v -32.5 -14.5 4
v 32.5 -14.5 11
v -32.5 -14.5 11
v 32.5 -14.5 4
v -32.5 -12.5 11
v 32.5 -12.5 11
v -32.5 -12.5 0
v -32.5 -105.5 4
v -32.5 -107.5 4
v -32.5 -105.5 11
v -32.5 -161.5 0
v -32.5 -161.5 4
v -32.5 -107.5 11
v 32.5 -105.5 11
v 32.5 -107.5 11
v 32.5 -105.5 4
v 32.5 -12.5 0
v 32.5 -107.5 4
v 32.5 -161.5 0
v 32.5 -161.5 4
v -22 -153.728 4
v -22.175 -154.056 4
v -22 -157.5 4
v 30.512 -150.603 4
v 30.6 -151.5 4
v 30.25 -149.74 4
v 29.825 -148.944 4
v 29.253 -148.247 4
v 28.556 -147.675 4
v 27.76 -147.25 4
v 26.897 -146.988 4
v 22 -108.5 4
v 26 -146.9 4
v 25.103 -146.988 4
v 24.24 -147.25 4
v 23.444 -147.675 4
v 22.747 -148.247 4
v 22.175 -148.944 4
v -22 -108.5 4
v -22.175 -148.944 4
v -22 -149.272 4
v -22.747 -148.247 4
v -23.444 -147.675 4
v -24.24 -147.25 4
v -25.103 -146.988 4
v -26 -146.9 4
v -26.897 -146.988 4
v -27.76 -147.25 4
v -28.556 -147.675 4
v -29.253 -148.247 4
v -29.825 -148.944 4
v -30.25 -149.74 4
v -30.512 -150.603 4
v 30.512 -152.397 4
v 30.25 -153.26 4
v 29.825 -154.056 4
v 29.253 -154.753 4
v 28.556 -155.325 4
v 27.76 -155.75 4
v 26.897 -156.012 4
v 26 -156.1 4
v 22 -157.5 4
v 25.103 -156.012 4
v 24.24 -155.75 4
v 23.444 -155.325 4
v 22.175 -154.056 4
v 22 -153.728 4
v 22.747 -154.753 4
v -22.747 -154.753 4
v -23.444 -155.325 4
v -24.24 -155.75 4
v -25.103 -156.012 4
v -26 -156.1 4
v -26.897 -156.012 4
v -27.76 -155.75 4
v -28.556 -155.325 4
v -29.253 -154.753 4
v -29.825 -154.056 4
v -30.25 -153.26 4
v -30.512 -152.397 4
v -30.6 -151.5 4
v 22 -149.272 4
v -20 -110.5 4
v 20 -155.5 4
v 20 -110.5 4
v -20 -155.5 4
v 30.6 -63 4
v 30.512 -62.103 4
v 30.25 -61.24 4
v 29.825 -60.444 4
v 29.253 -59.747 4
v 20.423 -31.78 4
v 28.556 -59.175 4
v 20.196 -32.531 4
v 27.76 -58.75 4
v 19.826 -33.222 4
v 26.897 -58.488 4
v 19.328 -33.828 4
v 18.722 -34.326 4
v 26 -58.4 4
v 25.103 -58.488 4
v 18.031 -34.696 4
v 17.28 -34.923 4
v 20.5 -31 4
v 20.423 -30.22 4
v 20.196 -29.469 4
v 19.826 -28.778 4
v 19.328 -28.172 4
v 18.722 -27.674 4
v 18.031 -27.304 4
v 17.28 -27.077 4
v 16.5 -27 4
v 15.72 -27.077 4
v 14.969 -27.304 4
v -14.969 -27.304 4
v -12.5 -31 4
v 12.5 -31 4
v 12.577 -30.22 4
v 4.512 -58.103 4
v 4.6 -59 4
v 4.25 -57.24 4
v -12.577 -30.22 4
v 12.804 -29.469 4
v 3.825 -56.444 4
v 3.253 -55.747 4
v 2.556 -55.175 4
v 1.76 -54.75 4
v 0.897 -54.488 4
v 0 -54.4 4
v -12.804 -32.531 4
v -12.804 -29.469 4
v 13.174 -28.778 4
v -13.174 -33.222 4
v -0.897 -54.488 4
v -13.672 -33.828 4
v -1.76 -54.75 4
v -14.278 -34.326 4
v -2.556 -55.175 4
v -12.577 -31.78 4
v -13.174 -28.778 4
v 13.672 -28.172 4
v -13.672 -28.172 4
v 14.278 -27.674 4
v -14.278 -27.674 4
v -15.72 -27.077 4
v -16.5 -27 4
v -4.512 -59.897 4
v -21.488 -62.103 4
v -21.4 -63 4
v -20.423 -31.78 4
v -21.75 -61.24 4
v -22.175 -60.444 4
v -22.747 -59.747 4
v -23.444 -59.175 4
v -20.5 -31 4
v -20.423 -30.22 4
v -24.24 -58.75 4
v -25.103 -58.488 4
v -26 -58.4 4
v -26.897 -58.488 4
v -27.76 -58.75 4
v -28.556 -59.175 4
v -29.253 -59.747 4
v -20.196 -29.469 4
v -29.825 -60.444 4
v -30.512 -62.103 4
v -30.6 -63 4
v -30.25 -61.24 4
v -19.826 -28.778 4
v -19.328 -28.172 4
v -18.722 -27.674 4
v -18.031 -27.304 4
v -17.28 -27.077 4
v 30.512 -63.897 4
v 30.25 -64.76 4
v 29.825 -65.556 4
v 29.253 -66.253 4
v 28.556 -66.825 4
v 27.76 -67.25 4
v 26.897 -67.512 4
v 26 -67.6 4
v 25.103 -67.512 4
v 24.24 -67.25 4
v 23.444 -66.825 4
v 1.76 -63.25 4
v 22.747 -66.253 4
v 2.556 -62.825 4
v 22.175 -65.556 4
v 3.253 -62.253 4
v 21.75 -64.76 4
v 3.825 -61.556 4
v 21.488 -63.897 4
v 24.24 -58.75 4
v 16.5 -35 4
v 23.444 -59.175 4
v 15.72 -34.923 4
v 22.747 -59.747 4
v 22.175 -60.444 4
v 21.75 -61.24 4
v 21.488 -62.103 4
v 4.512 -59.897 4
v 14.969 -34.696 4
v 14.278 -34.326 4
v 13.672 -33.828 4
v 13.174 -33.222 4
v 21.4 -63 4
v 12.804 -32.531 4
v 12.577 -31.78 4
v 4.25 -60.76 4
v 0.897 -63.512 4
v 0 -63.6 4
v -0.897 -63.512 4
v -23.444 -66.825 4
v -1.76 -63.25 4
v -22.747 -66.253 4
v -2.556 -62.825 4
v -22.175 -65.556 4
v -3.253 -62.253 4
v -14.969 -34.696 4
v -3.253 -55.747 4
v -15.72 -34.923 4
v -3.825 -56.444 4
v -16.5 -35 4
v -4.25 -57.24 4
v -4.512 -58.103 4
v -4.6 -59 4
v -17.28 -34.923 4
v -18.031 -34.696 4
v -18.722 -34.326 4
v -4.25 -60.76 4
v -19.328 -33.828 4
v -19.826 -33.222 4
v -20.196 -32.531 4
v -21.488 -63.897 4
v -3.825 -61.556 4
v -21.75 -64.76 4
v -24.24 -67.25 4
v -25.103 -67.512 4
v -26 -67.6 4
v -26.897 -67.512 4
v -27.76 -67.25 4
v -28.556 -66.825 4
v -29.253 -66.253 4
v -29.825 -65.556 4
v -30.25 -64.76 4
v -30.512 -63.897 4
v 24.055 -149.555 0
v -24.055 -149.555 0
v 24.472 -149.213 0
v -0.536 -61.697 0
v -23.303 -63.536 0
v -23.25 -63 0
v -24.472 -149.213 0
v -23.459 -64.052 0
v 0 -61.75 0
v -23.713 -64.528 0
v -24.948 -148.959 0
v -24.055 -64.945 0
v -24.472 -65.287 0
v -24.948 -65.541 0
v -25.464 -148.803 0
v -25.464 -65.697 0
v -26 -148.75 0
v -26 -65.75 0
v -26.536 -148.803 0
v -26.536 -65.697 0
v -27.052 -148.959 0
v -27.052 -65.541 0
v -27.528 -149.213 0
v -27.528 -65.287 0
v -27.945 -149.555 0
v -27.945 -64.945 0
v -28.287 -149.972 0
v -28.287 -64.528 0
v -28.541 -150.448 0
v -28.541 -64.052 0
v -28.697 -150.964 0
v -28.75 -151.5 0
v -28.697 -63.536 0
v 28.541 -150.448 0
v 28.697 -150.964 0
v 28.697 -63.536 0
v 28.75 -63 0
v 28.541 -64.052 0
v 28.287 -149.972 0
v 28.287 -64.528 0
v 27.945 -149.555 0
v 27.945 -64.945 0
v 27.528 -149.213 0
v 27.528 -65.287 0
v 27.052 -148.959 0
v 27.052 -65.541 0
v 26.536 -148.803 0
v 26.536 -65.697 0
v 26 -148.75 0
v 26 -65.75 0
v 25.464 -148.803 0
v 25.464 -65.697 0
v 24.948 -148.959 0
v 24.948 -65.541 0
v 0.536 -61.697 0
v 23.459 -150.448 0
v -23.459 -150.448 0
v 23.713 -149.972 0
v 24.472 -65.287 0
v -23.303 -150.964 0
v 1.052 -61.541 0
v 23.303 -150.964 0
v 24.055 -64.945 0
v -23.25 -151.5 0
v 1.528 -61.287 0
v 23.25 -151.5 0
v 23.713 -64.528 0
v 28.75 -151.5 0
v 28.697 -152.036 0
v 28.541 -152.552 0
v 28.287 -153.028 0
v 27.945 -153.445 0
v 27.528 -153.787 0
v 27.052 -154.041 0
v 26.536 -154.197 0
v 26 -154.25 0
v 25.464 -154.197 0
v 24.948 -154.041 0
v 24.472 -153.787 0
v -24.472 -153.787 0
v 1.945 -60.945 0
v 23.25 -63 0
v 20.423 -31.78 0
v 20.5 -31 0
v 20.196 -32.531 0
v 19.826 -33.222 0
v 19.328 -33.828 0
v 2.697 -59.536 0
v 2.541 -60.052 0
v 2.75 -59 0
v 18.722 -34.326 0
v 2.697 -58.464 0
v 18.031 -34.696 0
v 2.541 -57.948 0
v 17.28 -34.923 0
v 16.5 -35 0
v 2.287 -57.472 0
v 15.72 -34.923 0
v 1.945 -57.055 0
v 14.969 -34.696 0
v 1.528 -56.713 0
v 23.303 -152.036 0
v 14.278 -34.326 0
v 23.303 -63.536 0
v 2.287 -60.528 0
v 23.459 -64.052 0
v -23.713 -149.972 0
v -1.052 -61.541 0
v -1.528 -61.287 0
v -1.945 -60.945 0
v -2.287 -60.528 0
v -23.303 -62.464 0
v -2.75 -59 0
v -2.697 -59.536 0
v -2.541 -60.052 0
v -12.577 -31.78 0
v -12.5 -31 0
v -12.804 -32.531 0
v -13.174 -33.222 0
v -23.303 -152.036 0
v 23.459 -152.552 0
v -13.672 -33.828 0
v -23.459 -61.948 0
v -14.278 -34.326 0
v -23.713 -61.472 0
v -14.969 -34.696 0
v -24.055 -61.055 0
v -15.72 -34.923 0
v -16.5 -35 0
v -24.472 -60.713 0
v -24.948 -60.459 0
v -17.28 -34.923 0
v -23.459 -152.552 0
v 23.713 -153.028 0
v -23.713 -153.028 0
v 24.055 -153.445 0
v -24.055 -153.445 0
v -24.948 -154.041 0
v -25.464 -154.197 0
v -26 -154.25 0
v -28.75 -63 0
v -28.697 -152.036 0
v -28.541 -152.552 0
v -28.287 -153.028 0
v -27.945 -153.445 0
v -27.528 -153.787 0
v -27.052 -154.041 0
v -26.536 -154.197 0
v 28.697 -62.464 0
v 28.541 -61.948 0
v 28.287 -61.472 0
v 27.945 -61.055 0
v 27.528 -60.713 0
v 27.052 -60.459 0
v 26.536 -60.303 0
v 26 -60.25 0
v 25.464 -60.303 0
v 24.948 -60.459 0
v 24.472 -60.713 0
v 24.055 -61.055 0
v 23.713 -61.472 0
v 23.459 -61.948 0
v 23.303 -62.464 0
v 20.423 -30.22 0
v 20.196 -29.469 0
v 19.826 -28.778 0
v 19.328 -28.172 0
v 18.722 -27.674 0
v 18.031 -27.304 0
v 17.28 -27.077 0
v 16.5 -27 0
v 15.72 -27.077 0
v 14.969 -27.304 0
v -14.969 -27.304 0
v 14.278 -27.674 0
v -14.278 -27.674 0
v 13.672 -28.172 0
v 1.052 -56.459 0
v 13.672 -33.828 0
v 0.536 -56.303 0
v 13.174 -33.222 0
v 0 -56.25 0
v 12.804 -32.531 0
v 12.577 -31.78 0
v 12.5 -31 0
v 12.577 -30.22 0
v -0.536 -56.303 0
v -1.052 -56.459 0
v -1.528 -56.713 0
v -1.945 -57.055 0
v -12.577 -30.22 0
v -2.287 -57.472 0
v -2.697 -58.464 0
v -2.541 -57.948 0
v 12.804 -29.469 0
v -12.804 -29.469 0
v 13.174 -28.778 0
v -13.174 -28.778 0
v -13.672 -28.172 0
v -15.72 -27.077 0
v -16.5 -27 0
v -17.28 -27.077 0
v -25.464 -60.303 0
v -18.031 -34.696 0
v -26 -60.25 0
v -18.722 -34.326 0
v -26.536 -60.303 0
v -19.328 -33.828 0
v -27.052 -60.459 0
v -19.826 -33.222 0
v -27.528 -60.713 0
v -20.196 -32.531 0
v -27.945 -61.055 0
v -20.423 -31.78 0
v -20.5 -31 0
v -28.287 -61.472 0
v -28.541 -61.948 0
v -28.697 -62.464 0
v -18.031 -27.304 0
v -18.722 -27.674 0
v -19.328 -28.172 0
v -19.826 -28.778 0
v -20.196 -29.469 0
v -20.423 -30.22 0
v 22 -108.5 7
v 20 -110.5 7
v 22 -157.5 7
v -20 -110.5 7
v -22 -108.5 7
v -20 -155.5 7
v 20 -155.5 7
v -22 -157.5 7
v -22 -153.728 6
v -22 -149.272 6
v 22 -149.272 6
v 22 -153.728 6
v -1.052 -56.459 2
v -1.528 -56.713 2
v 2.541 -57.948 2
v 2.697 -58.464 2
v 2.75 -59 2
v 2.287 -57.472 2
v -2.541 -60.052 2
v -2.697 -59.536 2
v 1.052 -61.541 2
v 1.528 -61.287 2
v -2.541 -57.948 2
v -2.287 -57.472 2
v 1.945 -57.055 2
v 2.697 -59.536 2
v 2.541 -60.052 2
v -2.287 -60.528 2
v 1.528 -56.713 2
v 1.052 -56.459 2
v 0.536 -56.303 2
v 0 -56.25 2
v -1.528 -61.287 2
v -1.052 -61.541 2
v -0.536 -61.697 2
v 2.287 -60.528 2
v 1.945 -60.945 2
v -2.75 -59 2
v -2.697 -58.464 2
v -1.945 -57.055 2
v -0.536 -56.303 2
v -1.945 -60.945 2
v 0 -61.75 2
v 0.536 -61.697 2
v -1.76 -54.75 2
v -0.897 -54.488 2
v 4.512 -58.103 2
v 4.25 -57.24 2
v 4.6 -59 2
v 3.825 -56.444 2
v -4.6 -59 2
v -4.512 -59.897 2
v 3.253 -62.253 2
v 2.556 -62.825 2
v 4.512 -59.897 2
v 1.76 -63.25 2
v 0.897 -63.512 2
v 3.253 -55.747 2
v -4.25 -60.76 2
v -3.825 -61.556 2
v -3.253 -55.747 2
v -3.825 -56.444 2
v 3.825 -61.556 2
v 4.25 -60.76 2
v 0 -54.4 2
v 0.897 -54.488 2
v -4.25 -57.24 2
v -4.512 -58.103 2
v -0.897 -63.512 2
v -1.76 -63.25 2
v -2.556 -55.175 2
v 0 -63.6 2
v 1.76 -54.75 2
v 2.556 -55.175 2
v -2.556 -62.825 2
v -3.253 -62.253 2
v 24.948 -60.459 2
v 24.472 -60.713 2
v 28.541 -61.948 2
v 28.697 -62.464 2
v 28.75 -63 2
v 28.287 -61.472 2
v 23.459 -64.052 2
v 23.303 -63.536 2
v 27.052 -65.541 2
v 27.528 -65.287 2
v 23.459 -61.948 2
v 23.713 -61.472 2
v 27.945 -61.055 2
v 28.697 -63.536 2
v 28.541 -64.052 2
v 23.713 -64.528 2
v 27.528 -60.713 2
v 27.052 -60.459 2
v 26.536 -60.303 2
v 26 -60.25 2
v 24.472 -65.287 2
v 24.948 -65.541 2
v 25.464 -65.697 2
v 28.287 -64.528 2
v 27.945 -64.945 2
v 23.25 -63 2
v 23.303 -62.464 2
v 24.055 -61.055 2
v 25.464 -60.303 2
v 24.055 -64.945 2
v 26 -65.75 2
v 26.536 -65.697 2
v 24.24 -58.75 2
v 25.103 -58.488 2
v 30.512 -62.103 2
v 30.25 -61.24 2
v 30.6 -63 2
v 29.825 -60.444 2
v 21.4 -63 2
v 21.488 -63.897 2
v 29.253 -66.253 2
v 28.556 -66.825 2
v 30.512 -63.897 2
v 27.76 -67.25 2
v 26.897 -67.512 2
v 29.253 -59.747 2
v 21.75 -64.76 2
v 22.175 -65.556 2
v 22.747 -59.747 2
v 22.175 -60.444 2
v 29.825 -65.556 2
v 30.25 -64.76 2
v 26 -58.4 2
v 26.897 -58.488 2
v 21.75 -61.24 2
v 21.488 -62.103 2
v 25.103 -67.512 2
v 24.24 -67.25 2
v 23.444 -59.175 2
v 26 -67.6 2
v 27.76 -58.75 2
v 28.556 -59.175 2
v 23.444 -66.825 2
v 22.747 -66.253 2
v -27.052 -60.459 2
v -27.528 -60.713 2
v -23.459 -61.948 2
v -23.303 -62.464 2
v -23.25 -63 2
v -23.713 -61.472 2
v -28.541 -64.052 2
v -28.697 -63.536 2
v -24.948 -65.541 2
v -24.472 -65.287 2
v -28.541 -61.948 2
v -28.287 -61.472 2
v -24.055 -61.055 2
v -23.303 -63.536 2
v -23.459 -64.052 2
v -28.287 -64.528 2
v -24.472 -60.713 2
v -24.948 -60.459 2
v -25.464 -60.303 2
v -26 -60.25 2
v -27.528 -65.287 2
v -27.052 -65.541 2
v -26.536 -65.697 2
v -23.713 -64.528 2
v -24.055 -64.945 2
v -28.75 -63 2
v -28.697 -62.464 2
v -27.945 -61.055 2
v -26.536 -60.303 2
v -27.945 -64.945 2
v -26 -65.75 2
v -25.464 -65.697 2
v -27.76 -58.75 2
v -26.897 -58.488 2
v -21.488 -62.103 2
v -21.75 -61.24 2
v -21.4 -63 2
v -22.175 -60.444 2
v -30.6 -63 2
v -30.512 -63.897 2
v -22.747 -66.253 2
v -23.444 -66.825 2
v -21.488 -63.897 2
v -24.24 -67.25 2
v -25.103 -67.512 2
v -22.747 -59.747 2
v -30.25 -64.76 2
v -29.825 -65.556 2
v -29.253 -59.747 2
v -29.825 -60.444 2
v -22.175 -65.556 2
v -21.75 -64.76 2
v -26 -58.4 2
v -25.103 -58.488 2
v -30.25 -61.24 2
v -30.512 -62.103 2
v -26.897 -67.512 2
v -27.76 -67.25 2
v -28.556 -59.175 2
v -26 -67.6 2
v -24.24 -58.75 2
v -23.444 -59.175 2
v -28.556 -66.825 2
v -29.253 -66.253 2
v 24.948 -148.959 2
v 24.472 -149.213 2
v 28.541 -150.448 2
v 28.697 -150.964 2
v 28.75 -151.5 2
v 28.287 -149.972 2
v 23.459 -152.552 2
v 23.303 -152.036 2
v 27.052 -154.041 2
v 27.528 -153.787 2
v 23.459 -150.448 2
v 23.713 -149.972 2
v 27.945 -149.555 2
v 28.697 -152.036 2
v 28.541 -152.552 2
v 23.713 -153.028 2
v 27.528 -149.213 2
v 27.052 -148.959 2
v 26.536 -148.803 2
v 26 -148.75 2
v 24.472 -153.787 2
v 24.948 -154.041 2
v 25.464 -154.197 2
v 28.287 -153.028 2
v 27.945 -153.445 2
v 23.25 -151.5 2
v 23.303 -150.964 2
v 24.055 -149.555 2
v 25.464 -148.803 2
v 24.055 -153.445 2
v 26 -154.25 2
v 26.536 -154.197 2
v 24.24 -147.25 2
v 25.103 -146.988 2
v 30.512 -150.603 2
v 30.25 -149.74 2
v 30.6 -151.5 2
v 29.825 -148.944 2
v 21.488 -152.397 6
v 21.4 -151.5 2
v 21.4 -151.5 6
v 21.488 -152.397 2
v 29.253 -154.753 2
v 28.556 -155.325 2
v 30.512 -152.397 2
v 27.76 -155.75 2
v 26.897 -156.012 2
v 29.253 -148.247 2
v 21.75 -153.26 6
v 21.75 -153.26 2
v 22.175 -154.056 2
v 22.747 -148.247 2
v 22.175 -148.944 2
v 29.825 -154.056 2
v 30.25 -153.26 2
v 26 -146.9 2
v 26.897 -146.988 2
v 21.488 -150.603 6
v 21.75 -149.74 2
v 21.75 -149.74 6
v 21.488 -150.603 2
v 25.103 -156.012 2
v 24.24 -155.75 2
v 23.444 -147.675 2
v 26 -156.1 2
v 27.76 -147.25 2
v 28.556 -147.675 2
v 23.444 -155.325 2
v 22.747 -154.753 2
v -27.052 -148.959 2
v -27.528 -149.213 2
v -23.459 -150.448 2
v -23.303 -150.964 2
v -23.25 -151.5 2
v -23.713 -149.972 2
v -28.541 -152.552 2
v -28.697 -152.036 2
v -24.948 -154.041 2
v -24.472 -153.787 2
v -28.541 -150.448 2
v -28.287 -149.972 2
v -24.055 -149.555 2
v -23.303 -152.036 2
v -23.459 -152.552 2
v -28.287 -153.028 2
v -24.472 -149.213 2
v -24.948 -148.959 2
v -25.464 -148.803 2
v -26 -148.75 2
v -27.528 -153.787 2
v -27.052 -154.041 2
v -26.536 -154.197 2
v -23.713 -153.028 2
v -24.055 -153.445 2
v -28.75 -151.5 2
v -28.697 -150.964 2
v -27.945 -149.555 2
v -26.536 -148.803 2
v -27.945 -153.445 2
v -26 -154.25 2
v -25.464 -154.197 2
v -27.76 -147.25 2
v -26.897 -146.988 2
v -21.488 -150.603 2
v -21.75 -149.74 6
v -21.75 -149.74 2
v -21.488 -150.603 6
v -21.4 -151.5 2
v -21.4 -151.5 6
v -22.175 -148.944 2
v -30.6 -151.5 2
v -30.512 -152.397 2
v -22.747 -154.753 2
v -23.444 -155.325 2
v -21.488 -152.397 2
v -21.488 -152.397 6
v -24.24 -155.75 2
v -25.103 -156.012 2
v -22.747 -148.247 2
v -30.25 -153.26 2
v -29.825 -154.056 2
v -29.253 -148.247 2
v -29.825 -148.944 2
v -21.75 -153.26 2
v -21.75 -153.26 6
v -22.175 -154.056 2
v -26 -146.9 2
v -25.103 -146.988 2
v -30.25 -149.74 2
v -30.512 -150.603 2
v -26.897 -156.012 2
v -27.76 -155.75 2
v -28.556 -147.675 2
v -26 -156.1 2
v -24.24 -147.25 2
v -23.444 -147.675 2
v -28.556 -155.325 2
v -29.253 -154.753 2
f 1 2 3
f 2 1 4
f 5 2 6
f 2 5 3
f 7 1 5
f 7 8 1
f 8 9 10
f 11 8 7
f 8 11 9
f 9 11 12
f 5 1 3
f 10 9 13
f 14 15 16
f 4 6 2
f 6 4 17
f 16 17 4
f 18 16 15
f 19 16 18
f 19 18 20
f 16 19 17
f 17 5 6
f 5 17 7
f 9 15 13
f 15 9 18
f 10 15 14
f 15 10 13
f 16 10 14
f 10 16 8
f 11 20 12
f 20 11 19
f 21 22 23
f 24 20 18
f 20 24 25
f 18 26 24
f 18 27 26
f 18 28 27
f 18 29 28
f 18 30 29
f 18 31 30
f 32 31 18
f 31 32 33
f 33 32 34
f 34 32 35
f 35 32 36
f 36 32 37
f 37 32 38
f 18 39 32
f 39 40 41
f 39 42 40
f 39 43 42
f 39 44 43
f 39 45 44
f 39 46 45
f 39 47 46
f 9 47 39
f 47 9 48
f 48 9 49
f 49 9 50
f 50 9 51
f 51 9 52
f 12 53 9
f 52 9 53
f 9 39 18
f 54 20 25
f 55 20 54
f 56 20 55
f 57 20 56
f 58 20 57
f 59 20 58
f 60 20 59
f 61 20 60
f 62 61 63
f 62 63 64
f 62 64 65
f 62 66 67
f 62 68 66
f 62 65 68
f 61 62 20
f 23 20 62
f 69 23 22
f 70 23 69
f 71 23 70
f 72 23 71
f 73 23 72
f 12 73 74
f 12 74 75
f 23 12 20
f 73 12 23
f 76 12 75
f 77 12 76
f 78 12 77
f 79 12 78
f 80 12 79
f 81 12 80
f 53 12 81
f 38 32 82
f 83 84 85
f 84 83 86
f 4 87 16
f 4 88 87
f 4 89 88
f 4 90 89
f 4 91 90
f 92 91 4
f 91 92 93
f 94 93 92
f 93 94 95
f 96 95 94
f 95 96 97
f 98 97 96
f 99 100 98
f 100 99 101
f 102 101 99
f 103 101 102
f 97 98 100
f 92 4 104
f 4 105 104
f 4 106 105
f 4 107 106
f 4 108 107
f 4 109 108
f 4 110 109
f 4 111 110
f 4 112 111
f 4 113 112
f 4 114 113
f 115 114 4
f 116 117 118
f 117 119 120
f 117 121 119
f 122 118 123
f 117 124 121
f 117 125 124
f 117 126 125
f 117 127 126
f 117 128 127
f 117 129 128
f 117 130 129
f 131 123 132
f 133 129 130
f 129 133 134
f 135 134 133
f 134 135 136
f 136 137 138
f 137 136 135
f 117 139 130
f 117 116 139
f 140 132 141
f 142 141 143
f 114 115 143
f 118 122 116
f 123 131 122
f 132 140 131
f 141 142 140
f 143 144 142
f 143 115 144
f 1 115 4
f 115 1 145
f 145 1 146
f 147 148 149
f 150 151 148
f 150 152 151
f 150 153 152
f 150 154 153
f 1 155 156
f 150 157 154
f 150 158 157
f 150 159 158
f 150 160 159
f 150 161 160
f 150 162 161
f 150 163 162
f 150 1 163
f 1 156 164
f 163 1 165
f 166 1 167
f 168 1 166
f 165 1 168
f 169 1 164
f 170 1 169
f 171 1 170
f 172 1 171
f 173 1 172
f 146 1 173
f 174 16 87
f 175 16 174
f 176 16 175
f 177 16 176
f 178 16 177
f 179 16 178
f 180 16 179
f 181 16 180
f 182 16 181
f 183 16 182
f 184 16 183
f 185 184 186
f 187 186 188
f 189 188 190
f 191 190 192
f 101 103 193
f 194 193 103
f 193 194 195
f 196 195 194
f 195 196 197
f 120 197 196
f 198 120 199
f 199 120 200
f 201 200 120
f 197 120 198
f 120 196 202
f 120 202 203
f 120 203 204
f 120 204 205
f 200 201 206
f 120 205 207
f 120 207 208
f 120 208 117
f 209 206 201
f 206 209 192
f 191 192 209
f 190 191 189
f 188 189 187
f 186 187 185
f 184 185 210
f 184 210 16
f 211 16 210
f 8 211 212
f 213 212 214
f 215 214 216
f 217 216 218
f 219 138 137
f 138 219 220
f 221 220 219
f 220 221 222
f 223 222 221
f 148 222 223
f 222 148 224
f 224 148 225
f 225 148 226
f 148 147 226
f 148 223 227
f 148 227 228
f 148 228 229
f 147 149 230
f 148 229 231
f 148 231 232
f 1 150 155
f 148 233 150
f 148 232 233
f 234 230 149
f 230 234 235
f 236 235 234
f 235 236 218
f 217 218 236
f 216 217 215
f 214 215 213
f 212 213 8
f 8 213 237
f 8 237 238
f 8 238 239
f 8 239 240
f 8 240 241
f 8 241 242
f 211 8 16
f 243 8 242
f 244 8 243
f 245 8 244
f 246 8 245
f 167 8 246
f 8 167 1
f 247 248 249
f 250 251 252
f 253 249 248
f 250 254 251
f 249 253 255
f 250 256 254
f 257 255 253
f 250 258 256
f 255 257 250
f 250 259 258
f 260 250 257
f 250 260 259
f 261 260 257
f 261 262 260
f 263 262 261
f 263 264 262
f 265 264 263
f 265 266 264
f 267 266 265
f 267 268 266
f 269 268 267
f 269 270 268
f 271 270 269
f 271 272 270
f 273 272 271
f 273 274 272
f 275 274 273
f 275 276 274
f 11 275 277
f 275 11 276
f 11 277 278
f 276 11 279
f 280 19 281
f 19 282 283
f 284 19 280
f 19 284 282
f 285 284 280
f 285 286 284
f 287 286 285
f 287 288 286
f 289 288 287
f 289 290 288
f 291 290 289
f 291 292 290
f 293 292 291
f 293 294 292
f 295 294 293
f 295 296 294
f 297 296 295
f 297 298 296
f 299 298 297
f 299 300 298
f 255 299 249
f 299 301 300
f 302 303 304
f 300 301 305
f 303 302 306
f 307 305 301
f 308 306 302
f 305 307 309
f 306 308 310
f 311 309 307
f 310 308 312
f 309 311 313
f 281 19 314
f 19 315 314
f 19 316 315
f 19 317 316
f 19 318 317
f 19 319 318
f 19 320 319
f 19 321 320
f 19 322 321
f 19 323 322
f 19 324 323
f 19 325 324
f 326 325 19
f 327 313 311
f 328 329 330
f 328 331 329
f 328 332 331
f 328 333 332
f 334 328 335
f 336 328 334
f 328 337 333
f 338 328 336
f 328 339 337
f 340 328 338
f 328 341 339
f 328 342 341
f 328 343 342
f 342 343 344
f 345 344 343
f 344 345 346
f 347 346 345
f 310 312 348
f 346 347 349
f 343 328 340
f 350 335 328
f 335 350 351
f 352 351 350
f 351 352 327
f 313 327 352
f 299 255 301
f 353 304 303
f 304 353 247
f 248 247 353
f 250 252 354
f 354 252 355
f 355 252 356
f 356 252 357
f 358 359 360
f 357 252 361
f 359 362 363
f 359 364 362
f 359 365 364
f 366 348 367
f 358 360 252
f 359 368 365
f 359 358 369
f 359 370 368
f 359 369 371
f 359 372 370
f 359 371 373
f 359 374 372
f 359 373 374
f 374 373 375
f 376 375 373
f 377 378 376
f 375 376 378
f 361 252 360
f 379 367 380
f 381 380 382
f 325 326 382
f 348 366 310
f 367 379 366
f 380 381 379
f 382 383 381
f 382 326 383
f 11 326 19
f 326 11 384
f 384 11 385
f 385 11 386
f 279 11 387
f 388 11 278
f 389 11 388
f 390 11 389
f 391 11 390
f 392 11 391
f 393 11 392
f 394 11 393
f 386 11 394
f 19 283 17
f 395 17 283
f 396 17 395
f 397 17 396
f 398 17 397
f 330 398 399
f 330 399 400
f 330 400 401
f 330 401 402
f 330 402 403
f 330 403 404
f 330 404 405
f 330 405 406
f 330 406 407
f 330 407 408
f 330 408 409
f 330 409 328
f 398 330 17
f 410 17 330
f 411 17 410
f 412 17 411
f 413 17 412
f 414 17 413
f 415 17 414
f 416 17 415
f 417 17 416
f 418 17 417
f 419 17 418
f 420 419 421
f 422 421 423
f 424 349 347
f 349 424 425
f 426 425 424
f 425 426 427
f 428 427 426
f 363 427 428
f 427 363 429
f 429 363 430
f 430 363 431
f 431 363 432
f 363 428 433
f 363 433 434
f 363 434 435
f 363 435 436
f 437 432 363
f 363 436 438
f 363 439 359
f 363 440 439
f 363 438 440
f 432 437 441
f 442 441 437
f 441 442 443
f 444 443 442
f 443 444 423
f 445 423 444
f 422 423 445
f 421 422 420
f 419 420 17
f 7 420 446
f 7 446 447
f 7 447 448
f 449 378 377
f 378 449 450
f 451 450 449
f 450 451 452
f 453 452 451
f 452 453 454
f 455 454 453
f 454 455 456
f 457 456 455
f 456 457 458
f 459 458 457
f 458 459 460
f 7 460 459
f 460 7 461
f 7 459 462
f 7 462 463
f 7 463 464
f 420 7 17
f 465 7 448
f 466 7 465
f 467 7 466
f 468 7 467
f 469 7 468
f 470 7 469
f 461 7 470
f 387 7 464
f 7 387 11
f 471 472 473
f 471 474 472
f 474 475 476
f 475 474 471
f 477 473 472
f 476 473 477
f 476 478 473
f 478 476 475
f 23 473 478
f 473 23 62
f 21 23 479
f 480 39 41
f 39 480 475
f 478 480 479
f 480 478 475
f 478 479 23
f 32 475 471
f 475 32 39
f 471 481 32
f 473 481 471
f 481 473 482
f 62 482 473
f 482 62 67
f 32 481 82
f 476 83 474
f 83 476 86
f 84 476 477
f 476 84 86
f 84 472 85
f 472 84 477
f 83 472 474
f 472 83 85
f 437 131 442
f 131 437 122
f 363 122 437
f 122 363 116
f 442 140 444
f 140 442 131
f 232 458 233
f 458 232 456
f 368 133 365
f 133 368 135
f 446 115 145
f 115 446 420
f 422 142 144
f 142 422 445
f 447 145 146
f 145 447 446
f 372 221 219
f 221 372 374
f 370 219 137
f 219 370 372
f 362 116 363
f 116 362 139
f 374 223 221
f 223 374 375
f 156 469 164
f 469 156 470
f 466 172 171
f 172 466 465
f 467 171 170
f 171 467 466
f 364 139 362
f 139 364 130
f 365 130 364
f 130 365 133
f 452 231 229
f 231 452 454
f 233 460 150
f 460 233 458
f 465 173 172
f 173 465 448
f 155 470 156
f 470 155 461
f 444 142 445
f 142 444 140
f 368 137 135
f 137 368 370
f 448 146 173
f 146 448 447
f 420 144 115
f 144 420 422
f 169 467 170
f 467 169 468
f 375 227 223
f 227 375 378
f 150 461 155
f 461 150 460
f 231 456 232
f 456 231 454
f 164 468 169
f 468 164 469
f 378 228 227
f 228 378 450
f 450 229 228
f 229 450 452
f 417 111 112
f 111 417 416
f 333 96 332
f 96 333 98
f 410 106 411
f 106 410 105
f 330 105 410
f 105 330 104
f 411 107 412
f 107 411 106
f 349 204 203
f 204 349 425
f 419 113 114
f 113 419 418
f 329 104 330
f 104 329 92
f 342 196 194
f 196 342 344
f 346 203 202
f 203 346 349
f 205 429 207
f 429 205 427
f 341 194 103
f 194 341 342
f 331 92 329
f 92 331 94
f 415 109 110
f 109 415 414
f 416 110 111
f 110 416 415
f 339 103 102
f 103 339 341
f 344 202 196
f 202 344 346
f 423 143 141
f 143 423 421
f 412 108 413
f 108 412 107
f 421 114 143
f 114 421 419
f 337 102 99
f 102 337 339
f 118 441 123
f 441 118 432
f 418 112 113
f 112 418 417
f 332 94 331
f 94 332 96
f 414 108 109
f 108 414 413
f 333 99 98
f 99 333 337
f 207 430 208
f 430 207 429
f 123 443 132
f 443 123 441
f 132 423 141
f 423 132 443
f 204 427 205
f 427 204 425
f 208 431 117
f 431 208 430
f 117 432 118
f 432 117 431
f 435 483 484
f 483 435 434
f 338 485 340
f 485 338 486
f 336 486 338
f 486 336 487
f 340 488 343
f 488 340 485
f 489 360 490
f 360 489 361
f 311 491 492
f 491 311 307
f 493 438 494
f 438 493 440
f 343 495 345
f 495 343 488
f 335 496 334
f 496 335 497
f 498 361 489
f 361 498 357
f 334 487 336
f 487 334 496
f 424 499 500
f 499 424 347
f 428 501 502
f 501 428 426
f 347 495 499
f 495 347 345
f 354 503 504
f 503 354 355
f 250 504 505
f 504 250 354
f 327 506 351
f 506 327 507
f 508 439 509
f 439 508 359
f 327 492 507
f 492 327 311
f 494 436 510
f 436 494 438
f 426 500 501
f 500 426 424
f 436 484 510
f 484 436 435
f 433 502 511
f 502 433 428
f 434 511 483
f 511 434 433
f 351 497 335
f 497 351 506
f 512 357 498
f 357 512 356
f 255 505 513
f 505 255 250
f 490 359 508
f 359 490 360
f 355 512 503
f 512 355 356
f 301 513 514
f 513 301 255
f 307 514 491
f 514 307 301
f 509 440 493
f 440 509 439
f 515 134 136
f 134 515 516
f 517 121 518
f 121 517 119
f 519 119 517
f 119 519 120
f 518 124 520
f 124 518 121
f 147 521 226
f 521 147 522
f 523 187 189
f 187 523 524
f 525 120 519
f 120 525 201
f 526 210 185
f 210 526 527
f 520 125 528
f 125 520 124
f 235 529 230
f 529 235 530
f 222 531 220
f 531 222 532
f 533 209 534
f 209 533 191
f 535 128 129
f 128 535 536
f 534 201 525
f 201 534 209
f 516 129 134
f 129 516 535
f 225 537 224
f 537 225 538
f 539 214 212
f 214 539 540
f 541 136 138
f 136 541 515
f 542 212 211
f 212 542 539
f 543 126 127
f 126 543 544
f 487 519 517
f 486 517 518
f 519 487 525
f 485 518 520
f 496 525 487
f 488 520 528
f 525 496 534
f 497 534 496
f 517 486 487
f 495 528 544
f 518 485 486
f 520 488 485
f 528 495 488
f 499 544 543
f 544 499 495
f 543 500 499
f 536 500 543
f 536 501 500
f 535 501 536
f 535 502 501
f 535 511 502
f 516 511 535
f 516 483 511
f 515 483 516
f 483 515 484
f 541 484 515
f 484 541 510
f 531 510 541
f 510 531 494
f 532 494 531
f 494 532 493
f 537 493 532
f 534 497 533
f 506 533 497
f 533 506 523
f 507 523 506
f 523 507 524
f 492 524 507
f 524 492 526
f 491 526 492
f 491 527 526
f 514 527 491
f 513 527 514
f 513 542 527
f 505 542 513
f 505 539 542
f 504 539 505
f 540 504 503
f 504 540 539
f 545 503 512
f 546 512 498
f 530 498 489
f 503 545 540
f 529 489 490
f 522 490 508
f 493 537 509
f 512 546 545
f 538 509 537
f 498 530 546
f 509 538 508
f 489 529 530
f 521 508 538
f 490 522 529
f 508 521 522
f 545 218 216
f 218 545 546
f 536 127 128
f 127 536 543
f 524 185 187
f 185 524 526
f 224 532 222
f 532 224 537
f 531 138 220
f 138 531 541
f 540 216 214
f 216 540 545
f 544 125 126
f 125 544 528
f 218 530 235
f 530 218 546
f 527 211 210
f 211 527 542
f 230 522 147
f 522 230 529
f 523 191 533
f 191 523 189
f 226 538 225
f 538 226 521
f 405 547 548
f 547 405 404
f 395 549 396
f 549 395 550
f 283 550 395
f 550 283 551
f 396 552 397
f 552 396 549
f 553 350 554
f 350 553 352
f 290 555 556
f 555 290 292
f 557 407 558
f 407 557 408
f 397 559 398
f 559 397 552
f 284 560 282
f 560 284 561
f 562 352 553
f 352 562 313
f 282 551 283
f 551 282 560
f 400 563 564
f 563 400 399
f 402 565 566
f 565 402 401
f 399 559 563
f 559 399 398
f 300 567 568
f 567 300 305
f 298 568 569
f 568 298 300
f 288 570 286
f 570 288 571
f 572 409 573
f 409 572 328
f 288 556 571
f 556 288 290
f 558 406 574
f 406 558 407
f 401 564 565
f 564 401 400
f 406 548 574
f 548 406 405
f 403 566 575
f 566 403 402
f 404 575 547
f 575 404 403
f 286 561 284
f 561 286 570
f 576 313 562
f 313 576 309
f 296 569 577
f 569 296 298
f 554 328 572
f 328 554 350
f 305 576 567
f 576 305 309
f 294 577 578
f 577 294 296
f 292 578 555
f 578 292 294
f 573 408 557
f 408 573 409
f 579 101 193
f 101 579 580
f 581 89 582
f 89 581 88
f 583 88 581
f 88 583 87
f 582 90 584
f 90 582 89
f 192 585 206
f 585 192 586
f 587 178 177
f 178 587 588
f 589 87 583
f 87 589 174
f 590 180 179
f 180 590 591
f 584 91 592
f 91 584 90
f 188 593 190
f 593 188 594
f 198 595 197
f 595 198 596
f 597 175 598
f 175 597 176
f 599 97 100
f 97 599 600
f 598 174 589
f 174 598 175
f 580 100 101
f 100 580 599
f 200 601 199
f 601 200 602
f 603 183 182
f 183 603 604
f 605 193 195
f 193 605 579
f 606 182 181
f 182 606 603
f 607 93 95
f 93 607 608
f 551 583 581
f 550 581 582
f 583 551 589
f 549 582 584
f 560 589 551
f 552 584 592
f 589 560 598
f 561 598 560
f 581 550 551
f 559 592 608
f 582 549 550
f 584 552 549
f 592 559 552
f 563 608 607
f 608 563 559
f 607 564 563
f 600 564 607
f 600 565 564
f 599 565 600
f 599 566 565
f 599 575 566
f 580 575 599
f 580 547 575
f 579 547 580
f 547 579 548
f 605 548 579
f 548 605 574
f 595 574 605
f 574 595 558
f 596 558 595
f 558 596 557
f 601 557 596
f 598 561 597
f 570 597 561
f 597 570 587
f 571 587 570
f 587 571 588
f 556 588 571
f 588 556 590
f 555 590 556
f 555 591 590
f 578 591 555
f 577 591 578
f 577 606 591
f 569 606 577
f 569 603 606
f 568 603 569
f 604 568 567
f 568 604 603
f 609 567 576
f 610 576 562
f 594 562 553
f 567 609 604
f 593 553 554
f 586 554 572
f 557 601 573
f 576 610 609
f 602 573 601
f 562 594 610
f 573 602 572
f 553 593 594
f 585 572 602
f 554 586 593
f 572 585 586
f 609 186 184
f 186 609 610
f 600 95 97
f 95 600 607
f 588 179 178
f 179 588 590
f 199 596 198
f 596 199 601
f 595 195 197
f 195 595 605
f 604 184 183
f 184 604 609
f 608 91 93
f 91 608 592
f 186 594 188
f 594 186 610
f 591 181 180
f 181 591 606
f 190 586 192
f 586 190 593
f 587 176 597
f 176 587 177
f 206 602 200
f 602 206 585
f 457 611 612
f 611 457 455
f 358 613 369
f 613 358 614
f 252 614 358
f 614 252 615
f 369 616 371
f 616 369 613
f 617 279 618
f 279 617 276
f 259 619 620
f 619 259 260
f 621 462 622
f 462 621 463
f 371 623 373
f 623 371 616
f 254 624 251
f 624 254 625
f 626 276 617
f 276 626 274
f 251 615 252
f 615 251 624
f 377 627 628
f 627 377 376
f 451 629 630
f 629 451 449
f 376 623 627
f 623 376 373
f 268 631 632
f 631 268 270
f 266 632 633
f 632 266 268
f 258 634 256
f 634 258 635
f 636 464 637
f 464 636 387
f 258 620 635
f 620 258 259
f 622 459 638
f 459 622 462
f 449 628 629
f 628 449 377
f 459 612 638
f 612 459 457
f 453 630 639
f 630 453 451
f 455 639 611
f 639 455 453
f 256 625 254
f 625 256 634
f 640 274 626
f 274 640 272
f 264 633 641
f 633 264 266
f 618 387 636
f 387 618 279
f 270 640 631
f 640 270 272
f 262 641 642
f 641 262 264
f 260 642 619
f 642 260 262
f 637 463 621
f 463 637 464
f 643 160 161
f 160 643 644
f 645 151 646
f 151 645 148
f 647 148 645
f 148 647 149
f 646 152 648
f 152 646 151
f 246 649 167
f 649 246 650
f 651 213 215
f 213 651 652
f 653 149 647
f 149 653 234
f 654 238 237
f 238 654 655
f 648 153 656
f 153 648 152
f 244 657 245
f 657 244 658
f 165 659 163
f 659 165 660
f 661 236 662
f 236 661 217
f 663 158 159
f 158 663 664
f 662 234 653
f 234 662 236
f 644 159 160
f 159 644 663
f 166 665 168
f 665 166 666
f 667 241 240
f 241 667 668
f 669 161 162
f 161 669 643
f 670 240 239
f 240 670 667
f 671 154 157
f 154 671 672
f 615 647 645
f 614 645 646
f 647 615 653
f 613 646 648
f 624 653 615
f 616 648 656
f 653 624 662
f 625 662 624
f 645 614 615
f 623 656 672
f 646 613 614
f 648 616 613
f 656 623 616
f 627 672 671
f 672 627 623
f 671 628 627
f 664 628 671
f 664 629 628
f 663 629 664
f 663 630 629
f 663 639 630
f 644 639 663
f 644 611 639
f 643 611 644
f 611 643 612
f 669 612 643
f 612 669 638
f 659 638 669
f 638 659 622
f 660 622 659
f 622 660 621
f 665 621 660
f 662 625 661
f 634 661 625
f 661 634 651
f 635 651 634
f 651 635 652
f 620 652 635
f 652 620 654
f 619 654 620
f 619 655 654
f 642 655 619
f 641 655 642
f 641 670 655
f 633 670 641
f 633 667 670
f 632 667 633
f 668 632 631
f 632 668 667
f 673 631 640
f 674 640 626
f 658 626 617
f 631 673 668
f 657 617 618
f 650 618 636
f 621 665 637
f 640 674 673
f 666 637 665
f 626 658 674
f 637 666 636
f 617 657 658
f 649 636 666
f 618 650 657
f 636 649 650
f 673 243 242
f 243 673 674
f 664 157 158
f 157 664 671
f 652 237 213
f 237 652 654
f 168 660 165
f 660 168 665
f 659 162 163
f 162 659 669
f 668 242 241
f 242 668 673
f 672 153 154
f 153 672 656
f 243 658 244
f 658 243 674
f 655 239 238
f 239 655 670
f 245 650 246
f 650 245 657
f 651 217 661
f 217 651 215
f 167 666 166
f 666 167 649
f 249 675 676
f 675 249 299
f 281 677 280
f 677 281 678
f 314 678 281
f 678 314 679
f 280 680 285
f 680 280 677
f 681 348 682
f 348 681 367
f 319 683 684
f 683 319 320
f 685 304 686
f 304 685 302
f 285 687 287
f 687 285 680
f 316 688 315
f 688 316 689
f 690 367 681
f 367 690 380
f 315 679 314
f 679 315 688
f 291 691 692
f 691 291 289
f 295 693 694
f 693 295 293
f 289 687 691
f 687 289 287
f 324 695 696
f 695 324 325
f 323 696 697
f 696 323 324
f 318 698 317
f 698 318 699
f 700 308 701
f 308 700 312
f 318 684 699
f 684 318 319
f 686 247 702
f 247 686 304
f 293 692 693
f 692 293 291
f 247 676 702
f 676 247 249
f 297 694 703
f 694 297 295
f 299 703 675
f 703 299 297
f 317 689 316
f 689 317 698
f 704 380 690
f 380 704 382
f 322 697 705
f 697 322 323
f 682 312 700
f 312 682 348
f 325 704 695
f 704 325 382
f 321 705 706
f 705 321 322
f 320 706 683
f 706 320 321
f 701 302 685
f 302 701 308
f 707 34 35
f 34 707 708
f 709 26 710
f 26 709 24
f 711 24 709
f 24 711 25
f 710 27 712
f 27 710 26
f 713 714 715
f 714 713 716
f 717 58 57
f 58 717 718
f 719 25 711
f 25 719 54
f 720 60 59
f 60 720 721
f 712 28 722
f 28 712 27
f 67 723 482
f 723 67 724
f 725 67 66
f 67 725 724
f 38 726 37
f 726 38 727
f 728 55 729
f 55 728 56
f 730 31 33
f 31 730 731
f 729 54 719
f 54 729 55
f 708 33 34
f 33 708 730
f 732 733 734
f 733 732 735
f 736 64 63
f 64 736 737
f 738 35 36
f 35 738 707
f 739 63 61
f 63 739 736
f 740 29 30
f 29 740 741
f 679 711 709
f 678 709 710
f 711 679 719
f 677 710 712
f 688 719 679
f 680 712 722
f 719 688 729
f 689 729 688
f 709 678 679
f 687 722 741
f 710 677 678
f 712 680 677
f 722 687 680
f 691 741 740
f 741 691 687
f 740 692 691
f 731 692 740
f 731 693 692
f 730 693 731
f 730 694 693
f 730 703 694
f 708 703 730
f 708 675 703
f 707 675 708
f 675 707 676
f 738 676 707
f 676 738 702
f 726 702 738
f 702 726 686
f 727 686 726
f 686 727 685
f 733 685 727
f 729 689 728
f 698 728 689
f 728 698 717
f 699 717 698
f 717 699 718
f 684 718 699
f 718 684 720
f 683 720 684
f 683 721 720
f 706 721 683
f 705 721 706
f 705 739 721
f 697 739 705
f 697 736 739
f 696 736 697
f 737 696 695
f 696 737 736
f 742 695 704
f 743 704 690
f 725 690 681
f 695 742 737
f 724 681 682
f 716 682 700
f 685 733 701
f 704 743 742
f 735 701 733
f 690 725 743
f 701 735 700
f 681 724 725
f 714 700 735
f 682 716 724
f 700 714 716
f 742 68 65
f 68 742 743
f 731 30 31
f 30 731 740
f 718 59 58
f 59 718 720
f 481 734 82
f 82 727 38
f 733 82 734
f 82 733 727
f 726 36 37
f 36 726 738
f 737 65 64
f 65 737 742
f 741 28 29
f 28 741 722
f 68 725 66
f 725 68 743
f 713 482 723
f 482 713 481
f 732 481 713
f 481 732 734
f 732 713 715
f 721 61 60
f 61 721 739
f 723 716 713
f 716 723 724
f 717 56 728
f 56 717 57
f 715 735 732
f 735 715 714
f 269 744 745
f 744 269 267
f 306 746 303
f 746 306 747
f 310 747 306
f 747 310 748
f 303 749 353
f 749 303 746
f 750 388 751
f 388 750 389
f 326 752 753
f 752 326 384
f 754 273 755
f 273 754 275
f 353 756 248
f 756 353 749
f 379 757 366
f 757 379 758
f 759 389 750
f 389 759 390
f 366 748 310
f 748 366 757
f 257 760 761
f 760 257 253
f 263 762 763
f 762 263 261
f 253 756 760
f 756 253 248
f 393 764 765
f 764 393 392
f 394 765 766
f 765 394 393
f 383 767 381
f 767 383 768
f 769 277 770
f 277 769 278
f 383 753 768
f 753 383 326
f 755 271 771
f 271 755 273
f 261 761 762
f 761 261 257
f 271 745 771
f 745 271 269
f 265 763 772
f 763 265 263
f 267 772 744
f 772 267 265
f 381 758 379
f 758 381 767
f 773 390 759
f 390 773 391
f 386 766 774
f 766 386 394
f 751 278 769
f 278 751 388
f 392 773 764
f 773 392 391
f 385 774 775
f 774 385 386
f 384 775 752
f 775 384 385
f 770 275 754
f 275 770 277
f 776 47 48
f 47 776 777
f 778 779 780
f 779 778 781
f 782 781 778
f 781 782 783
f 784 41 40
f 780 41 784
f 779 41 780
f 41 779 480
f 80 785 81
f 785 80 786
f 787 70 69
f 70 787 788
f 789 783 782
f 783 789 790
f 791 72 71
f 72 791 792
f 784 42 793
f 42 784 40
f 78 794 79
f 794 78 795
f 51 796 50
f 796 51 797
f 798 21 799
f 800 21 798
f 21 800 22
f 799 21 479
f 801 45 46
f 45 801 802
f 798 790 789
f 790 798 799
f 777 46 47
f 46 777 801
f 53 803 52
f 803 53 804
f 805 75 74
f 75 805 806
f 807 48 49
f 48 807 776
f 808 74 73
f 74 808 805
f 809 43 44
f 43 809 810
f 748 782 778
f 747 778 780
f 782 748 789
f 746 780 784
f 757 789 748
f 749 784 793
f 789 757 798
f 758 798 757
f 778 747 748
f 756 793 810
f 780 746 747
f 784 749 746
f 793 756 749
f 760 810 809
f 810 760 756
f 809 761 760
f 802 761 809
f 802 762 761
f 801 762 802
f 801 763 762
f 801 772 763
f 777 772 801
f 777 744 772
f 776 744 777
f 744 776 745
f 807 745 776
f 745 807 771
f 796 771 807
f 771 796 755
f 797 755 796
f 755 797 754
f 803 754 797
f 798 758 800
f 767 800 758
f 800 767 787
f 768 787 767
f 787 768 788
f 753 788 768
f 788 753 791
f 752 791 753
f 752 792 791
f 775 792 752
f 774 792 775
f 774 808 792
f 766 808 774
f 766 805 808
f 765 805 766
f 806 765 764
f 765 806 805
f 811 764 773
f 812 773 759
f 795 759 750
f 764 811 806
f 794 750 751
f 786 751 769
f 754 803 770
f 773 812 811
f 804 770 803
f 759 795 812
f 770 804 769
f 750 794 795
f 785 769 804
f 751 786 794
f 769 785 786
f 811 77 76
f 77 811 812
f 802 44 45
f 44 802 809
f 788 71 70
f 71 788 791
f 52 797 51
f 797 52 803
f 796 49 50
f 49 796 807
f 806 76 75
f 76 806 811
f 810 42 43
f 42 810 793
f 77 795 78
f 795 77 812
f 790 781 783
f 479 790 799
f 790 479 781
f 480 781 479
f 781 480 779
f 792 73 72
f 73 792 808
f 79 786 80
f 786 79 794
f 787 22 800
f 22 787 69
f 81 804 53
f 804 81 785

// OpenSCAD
include <../lib/meshtastic-drybag-node-lib.scad>;
$fn = 40;
motor_plate_print();
